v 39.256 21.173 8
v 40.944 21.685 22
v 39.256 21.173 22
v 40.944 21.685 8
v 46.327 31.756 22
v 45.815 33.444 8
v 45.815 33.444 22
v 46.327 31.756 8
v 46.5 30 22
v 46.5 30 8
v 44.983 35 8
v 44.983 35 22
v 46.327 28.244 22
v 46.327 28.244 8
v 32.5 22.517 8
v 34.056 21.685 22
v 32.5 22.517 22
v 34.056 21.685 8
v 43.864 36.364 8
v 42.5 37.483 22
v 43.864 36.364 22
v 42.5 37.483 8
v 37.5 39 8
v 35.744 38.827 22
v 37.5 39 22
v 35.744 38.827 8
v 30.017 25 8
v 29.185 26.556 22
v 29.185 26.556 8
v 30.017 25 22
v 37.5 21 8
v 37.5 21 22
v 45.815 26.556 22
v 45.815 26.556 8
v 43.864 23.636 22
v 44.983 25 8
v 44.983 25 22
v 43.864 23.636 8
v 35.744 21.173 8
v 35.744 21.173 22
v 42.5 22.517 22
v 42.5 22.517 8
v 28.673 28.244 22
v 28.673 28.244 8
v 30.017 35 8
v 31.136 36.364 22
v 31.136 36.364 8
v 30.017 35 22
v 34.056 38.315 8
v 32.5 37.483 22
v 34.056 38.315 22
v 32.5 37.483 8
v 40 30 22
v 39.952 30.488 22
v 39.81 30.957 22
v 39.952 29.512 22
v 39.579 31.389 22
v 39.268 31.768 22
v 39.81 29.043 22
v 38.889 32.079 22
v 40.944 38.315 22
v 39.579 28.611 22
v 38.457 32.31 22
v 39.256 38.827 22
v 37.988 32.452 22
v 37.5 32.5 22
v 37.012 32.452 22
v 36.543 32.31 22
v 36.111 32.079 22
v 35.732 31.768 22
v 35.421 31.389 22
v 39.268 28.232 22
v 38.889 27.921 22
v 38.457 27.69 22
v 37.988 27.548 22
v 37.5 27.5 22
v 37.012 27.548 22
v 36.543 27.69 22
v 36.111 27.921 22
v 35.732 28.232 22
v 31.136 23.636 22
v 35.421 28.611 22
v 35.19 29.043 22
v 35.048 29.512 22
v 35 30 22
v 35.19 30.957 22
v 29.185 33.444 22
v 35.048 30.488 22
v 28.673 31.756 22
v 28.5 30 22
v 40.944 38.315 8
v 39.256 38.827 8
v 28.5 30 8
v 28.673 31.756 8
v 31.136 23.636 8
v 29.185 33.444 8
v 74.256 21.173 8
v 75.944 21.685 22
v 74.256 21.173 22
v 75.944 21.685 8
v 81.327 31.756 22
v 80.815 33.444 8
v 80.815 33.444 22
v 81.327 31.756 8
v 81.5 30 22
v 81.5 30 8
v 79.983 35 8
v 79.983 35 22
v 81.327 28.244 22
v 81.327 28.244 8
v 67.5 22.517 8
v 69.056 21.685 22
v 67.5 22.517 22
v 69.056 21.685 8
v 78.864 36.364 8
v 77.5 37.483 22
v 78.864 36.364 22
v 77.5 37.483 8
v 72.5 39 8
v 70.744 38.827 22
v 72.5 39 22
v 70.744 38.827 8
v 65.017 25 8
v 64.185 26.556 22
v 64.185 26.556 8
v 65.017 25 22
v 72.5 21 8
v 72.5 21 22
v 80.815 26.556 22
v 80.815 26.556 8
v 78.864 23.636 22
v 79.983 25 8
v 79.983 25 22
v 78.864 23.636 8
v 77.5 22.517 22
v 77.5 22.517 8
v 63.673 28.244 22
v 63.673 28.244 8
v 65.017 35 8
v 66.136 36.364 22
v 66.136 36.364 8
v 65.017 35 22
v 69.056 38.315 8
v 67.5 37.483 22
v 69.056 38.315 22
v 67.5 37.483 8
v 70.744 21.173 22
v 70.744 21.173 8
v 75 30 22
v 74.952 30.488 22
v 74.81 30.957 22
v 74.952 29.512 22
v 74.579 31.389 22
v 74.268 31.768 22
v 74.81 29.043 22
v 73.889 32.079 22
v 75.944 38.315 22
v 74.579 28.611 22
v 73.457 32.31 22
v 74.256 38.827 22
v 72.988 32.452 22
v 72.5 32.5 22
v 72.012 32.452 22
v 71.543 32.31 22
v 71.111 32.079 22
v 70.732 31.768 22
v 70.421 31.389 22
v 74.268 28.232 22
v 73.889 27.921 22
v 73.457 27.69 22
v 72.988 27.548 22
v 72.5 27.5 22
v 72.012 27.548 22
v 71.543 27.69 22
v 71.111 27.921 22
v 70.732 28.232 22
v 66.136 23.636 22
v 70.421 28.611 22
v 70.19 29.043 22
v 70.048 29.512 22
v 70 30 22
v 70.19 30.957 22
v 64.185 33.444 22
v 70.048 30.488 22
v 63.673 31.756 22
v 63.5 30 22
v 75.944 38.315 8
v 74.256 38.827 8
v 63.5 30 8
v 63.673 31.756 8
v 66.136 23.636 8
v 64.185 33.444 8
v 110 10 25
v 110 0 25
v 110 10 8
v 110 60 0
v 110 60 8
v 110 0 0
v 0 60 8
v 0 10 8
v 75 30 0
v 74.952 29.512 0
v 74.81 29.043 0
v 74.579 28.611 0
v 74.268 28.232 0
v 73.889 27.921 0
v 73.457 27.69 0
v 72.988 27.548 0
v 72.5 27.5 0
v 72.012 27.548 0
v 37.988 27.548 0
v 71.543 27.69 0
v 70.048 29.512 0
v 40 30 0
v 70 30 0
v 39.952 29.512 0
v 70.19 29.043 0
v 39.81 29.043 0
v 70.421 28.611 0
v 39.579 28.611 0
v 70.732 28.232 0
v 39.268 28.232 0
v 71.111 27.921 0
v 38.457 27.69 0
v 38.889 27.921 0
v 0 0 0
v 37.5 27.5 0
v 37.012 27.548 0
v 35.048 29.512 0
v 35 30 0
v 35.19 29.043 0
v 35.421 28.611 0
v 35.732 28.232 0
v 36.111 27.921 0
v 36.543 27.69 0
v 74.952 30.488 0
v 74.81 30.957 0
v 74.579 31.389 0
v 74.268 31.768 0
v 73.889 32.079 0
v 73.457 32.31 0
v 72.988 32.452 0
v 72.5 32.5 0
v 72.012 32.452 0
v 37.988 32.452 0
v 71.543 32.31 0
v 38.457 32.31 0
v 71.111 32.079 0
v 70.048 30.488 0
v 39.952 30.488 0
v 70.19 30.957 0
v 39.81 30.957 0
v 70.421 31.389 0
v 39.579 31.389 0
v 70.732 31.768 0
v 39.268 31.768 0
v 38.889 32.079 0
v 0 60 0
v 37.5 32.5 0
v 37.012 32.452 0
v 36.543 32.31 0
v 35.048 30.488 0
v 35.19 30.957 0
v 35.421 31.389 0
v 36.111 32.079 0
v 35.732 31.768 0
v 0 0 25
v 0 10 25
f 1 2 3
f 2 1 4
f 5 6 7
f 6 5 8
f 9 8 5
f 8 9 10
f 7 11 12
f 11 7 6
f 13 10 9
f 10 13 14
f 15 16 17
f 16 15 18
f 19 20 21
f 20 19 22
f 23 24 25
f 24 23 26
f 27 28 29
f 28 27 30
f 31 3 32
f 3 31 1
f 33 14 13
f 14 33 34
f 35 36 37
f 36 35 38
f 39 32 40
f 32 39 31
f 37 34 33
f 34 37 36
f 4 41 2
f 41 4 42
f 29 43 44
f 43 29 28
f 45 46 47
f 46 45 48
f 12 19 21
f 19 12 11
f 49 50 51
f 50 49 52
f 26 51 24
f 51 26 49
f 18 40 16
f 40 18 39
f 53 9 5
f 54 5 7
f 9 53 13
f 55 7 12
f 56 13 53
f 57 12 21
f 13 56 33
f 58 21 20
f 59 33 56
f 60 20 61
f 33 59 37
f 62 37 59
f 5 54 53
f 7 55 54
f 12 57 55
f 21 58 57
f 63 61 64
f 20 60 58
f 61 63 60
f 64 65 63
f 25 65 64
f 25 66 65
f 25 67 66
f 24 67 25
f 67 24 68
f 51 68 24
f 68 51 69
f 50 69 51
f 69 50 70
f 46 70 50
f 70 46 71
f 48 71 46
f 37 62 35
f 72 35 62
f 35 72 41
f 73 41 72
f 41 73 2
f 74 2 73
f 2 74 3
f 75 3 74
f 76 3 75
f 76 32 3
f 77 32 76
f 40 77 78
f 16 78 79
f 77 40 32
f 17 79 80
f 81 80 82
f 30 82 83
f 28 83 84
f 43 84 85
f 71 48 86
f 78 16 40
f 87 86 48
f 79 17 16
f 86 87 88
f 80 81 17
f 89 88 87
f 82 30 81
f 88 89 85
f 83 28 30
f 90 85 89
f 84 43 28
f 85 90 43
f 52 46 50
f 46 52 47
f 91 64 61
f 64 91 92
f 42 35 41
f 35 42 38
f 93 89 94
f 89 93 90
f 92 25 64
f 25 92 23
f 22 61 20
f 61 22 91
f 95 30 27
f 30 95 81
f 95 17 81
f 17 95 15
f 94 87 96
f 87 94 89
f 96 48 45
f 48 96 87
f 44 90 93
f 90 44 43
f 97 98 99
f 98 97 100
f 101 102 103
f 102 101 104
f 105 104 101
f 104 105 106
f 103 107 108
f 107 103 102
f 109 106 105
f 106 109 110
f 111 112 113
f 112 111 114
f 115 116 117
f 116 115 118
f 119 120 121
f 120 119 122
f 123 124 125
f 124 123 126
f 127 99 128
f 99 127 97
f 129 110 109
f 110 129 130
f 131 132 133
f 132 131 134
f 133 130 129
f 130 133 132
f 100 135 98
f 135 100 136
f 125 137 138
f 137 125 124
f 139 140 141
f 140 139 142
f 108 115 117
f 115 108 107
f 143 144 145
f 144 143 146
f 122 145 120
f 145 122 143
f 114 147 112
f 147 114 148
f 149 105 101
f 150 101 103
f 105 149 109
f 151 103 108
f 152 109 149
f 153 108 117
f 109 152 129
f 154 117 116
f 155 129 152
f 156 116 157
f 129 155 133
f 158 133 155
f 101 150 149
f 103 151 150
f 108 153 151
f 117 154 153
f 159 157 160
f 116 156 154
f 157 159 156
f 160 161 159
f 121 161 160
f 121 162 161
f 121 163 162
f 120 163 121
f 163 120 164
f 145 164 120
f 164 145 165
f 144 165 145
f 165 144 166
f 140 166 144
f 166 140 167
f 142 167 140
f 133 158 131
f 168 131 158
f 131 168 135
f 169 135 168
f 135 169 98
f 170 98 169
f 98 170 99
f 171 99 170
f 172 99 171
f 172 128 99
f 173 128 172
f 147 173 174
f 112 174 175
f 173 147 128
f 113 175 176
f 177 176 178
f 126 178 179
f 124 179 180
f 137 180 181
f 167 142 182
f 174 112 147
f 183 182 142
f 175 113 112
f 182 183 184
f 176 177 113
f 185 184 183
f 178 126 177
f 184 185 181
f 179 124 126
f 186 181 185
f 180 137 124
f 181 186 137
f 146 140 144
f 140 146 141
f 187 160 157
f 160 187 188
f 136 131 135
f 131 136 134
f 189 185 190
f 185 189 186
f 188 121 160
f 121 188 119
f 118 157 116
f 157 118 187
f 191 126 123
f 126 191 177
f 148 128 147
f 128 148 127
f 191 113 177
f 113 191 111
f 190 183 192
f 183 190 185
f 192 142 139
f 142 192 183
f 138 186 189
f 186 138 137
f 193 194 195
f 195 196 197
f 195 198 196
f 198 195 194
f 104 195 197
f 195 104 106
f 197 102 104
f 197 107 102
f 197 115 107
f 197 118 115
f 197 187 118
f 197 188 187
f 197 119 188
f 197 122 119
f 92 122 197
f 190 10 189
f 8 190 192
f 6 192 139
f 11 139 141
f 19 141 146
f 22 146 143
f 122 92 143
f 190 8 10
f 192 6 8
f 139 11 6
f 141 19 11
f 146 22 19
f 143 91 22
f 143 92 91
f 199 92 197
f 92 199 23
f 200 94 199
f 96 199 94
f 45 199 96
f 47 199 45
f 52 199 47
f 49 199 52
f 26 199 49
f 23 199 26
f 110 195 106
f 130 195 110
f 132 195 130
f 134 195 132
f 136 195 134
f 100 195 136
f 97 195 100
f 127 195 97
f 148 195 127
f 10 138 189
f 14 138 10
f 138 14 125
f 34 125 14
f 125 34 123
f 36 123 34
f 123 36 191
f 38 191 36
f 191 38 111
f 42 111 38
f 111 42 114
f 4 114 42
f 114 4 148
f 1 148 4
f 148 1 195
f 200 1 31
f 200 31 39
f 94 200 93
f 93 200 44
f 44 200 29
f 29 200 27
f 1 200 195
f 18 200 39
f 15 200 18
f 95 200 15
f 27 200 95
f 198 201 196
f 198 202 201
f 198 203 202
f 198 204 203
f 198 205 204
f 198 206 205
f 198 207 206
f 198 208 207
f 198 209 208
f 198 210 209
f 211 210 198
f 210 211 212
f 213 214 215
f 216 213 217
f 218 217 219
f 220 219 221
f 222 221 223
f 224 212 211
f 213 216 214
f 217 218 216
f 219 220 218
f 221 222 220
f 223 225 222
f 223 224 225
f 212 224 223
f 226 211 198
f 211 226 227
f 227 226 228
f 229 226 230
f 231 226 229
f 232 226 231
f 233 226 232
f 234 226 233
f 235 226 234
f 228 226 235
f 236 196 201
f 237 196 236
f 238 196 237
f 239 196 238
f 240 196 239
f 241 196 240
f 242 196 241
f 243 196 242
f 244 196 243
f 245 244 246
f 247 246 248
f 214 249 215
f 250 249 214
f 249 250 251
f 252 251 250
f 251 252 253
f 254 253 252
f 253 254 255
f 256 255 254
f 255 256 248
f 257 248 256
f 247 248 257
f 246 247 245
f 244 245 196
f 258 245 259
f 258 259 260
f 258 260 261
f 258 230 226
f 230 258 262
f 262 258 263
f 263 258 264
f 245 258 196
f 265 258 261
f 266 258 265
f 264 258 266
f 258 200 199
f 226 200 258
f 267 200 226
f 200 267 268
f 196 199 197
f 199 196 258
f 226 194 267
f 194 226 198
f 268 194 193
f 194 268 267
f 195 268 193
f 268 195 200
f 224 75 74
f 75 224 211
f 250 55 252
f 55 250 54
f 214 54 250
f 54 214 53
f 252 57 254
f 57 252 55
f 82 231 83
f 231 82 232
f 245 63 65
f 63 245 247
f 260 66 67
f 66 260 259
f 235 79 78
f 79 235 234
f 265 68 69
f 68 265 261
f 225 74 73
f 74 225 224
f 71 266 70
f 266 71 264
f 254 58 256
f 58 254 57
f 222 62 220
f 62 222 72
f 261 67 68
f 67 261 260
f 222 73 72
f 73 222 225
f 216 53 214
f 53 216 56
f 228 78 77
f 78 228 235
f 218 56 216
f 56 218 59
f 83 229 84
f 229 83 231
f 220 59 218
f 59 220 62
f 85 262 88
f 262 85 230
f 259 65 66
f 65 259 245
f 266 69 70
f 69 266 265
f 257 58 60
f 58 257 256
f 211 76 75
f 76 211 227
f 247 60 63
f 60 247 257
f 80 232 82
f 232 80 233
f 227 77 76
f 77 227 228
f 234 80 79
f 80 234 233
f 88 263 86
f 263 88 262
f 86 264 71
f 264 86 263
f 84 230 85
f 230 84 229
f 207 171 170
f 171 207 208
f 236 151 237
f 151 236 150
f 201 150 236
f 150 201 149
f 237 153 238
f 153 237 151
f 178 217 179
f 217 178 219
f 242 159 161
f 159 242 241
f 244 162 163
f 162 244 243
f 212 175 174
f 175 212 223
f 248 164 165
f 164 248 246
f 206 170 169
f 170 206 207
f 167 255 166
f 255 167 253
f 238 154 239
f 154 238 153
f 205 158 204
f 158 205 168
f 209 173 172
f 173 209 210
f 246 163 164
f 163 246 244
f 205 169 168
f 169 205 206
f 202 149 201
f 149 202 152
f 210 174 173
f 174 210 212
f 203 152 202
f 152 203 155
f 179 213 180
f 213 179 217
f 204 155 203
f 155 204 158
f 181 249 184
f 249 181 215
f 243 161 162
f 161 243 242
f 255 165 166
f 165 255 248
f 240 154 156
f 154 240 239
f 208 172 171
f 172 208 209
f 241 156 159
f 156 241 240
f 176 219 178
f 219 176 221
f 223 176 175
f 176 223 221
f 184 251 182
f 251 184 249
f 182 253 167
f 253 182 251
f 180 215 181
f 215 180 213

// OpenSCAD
$fn = 32;

// ----------------------------------------------------------------------
// Drill jig: fence jig
// ----------------------------------------------------------------------

// --- parameters (mm) ---
plate_l = 110;            // plate length, X
plate_w = 60;             // plate width, Y
plate_t = 8;              // plate thickness
boss_d = 18;              // guide boss diameter
boss_h = 15;              // boss height above the plate
guide_d = 5;              // guide hole diameter
boss_pitch = 35;          // boss pitch
fence_h = 18;             // fence height above the plate
fence_t = 10;             // fence thickness

n_boss = 2;  // guide bosses
boss_x0 = (plate_l - (n_boss - 1) * boss_pitch) / 2;  // first boss X
boss_top = plate_t - 1 + boss_h;  // boss crown height
fence_top = plate_t - 1 + fence_h;  // fence crown height
total_h = max([fence_top, boss_top]);  // overall height

difference() {
  union() {
  cube([plate_l, plate_w, plate_t]);
  for (i = [0 : n_boss - 1])
    translate([boss_x0 + i * boss_pitch, plate_w / 2, plate_t - 1])
      cylinder(h = boss_h, d = boss_d);
  translate([0, 0, plate_t - 1]) cube([plate_l, fence_t, fence_h]);
  }
  for (i = [0 : n_boss - 1])
    translate([boss_x0 + i * boss_pitch, plate_w / 2, -1])
      cylinder(h = plate_t + boss_h, d = guide_d);
}
